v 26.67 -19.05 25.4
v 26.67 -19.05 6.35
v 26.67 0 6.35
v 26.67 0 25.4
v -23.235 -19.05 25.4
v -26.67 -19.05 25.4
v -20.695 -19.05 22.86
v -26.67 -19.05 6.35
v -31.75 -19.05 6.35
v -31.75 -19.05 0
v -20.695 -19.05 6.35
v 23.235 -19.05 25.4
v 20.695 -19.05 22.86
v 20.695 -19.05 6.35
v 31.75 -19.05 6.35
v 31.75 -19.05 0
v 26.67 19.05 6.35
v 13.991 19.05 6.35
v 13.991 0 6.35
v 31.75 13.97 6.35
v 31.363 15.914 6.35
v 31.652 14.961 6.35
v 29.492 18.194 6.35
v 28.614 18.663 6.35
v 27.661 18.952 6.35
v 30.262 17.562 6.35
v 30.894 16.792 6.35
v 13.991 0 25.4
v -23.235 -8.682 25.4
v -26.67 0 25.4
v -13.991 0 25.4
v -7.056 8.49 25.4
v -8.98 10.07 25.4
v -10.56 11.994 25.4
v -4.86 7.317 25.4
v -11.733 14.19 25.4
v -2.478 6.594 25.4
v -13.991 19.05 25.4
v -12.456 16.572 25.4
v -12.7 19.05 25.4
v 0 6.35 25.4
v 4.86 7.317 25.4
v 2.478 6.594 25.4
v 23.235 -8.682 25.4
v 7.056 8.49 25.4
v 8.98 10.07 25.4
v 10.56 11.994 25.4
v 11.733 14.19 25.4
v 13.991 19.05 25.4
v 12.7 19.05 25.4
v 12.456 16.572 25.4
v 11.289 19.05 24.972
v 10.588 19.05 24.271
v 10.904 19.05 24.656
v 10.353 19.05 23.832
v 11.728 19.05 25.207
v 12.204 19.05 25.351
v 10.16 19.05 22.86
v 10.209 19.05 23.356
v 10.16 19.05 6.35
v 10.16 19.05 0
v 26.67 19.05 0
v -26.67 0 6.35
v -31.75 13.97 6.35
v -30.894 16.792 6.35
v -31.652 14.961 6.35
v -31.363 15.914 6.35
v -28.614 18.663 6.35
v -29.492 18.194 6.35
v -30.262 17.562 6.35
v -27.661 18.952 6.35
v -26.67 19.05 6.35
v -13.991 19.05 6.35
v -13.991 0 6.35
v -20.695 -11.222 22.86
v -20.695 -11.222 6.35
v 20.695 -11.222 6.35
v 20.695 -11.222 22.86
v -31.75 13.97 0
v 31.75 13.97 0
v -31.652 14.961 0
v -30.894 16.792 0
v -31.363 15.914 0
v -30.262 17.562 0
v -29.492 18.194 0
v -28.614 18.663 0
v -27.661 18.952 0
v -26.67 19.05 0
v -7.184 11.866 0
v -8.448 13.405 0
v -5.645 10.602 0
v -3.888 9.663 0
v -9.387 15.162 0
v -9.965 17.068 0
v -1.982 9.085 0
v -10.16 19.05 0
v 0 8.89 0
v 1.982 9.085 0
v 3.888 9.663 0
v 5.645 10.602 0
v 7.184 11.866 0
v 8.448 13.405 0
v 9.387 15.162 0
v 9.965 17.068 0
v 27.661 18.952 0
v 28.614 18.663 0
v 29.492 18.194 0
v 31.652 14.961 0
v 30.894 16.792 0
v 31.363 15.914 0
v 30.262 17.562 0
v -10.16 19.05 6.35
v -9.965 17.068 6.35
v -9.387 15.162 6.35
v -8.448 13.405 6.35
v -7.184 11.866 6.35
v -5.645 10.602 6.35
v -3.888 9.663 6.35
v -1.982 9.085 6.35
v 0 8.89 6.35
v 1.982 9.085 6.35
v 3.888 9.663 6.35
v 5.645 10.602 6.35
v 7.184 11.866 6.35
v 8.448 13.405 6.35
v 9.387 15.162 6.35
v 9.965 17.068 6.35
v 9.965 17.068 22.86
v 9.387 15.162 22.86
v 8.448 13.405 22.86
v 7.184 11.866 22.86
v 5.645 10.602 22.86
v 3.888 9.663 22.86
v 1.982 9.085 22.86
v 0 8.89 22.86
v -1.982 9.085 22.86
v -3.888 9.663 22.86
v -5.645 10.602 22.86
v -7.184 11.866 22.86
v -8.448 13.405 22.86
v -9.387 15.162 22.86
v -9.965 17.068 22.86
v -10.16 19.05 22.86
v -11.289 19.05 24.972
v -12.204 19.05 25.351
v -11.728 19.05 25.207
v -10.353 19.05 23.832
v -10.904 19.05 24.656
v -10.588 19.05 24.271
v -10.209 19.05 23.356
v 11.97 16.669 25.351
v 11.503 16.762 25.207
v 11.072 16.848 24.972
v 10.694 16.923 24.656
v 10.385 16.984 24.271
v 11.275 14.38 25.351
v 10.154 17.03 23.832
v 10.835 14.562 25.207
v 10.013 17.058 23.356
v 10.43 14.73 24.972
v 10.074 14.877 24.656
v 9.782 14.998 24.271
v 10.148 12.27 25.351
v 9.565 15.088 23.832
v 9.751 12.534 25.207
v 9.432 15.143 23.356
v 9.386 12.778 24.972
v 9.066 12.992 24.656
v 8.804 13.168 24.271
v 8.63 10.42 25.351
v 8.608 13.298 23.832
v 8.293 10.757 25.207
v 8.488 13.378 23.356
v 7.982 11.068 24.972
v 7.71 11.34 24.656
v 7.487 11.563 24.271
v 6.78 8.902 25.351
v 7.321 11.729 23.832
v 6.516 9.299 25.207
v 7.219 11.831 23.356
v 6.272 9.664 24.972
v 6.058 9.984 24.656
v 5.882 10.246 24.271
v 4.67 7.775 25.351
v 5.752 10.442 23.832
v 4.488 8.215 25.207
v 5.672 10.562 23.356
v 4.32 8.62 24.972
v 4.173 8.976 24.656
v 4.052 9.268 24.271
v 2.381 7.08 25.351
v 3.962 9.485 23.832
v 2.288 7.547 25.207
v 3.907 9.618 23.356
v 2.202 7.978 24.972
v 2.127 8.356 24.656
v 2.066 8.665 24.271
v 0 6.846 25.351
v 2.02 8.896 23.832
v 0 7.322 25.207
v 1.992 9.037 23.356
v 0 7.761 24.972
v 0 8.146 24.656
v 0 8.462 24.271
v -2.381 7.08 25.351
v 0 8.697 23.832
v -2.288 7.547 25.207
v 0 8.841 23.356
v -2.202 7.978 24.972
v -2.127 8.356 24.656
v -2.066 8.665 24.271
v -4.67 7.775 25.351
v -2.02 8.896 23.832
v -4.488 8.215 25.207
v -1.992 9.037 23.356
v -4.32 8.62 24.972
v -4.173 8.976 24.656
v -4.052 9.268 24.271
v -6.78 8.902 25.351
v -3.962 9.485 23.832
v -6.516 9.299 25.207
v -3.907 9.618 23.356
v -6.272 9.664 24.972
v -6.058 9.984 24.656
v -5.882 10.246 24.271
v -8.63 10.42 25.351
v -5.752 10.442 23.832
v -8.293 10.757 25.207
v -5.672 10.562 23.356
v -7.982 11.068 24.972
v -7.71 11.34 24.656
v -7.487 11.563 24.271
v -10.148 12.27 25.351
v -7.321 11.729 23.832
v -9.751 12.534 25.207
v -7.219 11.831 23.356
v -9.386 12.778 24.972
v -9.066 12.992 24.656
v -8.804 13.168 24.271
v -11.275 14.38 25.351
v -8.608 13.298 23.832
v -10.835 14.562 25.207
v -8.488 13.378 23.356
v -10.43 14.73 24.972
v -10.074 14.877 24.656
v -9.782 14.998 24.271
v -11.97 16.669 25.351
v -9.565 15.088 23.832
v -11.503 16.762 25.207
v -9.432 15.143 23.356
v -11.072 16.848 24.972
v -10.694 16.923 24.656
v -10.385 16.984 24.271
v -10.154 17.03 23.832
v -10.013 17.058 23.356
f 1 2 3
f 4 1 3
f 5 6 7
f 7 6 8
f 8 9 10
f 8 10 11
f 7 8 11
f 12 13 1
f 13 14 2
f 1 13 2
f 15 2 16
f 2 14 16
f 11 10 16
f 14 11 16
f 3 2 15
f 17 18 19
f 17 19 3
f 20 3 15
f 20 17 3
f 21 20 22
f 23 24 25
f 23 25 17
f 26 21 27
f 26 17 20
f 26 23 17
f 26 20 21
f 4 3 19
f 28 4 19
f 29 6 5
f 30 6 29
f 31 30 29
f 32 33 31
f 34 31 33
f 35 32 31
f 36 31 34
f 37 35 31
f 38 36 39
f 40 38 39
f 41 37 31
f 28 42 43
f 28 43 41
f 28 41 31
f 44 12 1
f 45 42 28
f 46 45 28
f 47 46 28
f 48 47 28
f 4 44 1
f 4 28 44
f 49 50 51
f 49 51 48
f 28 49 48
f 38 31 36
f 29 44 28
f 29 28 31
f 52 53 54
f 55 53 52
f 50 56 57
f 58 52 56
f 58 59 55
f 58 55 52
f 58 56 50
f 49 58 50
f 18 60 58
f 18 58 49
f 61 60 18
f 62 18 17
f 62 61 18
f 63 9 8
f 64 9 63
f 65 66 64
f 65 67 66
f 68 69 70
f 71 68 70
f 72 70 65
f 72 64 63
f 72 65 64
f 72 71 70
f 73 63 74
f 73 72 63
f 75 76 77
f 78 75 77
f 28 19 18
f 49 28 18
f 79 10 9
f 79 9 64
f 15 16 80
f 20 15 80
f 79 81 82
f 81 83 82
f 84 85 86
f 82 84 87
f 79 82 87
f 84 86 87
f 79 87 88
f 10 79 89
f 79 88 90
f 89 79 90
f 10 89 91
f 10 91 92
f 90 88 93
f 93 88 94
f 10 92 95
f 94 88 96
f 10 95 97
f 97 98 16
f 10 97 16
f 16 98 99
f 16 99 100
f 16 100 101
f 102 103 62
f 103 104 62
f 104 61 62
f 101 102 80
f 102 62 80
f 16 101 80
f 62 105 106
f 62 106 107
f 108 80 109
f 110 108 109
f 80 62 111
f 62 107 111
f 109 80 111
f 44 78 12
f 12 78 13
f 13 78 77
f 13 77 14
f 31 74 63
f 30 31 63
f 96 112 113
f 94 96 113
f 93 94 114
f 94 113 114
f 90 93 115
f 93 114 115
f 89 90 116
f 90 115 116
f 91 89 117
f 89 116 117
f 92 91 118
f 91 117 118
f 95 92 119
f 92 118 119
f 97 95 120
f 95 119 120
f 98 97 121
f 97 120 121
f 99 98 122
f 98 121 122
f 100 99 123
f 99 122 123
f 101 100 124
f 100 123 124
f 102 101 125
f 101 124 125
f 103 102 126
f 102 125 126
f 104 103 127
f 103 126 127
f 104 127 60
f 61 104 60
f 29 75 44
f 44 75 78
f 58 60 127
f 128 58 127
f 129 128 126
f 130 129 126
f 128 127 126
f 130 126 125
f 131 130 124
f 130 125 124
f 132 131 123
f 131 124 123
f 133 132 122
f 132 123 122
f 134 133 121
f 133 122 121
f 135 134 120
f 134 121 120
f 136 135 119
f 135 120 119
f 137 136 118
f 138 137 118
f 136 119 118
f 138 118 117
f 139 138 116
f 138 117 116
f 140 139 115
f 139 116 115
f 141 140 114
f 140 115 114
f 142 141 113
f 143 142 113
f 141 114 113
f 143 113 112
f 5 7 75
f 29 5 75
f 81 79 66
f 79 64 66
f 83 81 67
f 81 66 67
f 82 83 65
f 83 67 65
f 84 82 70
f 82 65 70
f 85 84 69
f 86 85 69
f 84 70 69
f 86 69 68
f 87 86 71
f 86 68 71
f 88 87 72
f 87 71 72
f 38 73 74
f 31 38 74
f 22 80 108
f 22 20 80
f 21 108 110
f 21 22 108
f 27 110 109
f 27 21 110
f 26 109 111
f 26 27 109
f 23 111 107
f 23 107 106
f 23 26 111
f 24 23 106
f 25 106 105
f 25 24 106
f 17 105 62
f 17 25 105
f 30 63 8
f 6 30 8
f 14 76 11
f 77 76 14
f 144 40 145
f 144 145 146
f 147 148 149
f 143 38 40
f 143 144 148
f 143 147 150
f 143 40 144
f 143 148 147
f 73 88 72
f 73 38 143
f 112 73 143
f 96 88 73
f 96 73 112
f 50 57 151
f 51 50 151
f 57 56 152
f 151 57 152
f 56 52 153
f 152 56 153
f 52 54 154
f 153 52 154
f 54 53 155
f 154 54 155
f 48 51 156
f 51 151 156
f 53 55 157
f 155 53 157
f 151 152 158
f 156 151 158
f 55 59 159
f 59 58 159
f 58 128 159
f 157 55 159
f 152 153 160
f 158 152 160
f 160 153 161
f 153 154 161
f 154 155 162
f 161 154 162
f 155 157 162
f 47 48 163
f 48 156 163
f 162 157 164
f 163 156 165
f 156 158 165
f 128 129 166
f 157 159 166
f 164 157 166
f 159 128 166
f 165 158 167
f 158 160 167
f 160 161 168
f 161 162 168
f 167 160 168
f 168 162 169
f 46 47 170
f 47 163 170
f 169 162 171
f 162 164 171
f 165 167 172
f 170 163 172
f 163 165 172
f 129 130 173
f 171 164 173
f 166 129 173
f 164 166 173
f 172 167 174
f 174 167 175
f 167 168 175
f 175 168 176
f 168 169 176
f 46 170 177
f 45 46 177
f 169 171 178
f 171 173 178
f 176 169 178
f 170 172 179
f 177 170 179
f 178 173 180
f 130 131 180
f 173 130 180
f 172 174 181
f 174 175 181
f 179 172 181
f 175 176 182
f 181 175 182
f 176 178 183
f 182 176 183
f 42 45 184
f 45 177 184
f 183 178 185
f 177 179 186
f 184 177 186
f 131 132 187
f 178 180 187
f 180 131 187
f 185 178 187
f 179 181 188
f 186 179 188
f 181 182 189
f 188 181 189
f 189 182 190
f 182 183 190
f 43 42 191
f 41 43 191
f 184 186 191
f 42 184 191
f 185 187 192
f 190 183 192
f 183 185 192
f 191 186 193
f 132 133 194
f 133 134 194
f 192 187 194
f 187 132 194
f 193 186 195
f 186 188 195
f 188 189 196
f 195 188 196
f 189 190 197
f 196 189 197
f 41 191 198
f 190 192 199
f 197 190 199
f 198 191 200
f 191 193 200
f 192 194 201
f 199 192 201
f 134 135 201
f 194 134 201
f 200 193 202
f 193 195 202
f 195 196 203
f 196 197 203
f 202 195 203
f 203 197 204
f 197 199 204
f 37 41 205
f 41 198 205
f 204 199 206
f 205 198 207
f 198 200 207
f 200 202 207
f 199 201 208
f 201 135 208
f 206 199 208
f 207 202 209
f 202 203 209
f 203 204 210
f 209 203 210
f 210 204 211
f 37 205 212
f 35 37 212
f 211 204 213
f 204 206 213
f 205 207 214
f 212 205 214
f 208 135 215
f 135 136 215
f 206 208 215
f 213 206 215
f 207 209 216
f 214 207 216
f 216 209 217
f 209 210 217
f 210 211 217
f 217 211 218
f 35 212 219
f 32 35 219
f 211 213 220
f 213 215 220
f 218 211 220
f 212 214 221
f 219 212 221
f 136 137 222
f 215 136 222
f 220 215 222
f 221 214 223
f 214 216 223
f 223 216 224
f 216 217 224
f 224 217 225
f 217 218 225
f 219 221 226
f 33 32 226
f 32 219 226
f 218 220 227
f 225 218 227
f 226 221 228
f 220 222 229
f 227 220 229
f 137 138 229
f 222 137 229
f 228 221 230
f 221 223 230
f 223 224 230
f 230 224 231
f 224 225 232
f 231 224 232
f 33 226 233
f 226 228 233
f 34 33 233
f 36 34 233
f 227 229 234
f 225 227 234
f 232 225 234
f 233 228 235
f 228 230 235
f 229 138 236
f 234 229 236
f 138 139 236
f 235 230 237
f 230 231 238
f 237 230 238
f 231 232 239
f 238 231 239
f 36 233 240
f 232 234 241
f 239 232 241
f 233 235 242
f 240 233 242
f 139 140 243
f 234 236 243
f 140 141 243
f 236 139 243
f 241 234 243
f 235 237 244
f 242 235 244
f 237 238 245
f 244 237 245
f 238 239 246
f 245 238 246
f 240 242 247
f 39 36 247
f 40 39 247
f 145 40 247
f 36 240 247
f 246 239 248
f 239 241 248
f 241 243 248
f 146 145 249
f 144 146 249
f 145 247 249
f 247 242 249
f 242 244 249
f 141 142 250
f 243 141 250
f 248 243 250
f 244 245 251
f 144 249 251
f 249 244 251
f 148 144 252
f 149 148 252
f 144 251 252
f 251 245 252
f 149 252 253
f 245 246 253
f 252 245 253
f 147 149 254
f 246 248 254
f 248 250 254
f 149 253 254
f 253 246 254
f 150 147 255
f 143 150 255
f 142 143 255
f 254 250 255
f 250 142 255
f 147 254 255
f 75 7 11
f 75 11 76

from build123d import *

# Parameters (mm, degrees)
F0_W     = 63.5
F0_H     = 38.1
F1_DEPTH = 6.35
F2_R     = 5.08
F4_DEPTH = 19.05
F3_R     = 10.16
F5_DEPTH = 25.4
F6_R     = 2.54
F7_SIZE  = 2.54


with BuildPart() as f1:
    # F0 (on Top) → F1 (new body)
    with BuildSketch(Plane.XY):
        Rectangle(F0_W, F0_H)
    extrude(amount=F1_DEPTH)

    # F2
    f2_edges = [f1.edges().sort_by_distance(p)[0] for p in [
        (-31.75, 19.05, 3.175),
        (31.75, 19.05, 3.175),
    ]]
    fillet(f2_edges, radius=F2_R)

    # F3 (on face) → F4 (join)
    with BuildSketch(Plane.XY.offset(6.35)):
        with BuildLine():
            Line((13.9908194542, 19.05), (10.16, 19.05))
            ThreePointArc((10.16, 19.05), (0, 8.89), (-10.16, 19.05))
            Line((-10.16, 19.05), (-13.9908194542, 19.05))
            Line((-13.9908194542, 19.05), (-13.9908194542, 0))
            Line((-13.9908194542, 0), (-26.67, 0))
            Line((-26.67, 0), (-26.67, -19.05))
            Line((-26.67, -19.05), (-20.6947550178, -19.05))
            Line((-20.6947550178, -19.05), (-20.6947550178, -11.2218027934))
            Line((-20.6947550178, -11.2218027934), (0, -11.2218027934))
            Line((0, -11.2218027934), (20.6947550178, -11.2218027934))
            Line((20.6947550178, -11.2218027934), (20.6947550178, -19.05))
            Line((20.6947550178, -19.05), (26.67, -19.05))
            Line((26.67, -19.05), (26.67, 0))
            Line((26.67, 0), (13.9908194542, 0))
            Line((13.9908194542, 0), (13.9908194542, 19.05))
        make_face()
    extrude(amount=F4_DEPTH)

    # F3 (on face) → F5 (cut)
    with BuildSketch(Plane.XY.offset(6.35)):
        with Locations((0, 19.05)):
            Circle(F3_R)
    extrude(amount=-F5_DEPTH, mode=Mode.SUBTRACT)

    # F6
    f6_edges = [f1.edges().sort_by_distance(p)[0] for p in [
        (0, 8.89, 25.4),
    ]]
    fillet(f6_edges, radius=F6_R)

    # F7
    f7_edges = [f1.edges().sort_by_distance(p)[0] for p in [
        (0, -11.221803, 25.4),
        (-20.694755, -15.135901, 25.4),
        (20.694755, -15.135901, 25.4),
    ]]
    chamfer(f7_edges, length=F7_SIZE)


solid = f1.part
